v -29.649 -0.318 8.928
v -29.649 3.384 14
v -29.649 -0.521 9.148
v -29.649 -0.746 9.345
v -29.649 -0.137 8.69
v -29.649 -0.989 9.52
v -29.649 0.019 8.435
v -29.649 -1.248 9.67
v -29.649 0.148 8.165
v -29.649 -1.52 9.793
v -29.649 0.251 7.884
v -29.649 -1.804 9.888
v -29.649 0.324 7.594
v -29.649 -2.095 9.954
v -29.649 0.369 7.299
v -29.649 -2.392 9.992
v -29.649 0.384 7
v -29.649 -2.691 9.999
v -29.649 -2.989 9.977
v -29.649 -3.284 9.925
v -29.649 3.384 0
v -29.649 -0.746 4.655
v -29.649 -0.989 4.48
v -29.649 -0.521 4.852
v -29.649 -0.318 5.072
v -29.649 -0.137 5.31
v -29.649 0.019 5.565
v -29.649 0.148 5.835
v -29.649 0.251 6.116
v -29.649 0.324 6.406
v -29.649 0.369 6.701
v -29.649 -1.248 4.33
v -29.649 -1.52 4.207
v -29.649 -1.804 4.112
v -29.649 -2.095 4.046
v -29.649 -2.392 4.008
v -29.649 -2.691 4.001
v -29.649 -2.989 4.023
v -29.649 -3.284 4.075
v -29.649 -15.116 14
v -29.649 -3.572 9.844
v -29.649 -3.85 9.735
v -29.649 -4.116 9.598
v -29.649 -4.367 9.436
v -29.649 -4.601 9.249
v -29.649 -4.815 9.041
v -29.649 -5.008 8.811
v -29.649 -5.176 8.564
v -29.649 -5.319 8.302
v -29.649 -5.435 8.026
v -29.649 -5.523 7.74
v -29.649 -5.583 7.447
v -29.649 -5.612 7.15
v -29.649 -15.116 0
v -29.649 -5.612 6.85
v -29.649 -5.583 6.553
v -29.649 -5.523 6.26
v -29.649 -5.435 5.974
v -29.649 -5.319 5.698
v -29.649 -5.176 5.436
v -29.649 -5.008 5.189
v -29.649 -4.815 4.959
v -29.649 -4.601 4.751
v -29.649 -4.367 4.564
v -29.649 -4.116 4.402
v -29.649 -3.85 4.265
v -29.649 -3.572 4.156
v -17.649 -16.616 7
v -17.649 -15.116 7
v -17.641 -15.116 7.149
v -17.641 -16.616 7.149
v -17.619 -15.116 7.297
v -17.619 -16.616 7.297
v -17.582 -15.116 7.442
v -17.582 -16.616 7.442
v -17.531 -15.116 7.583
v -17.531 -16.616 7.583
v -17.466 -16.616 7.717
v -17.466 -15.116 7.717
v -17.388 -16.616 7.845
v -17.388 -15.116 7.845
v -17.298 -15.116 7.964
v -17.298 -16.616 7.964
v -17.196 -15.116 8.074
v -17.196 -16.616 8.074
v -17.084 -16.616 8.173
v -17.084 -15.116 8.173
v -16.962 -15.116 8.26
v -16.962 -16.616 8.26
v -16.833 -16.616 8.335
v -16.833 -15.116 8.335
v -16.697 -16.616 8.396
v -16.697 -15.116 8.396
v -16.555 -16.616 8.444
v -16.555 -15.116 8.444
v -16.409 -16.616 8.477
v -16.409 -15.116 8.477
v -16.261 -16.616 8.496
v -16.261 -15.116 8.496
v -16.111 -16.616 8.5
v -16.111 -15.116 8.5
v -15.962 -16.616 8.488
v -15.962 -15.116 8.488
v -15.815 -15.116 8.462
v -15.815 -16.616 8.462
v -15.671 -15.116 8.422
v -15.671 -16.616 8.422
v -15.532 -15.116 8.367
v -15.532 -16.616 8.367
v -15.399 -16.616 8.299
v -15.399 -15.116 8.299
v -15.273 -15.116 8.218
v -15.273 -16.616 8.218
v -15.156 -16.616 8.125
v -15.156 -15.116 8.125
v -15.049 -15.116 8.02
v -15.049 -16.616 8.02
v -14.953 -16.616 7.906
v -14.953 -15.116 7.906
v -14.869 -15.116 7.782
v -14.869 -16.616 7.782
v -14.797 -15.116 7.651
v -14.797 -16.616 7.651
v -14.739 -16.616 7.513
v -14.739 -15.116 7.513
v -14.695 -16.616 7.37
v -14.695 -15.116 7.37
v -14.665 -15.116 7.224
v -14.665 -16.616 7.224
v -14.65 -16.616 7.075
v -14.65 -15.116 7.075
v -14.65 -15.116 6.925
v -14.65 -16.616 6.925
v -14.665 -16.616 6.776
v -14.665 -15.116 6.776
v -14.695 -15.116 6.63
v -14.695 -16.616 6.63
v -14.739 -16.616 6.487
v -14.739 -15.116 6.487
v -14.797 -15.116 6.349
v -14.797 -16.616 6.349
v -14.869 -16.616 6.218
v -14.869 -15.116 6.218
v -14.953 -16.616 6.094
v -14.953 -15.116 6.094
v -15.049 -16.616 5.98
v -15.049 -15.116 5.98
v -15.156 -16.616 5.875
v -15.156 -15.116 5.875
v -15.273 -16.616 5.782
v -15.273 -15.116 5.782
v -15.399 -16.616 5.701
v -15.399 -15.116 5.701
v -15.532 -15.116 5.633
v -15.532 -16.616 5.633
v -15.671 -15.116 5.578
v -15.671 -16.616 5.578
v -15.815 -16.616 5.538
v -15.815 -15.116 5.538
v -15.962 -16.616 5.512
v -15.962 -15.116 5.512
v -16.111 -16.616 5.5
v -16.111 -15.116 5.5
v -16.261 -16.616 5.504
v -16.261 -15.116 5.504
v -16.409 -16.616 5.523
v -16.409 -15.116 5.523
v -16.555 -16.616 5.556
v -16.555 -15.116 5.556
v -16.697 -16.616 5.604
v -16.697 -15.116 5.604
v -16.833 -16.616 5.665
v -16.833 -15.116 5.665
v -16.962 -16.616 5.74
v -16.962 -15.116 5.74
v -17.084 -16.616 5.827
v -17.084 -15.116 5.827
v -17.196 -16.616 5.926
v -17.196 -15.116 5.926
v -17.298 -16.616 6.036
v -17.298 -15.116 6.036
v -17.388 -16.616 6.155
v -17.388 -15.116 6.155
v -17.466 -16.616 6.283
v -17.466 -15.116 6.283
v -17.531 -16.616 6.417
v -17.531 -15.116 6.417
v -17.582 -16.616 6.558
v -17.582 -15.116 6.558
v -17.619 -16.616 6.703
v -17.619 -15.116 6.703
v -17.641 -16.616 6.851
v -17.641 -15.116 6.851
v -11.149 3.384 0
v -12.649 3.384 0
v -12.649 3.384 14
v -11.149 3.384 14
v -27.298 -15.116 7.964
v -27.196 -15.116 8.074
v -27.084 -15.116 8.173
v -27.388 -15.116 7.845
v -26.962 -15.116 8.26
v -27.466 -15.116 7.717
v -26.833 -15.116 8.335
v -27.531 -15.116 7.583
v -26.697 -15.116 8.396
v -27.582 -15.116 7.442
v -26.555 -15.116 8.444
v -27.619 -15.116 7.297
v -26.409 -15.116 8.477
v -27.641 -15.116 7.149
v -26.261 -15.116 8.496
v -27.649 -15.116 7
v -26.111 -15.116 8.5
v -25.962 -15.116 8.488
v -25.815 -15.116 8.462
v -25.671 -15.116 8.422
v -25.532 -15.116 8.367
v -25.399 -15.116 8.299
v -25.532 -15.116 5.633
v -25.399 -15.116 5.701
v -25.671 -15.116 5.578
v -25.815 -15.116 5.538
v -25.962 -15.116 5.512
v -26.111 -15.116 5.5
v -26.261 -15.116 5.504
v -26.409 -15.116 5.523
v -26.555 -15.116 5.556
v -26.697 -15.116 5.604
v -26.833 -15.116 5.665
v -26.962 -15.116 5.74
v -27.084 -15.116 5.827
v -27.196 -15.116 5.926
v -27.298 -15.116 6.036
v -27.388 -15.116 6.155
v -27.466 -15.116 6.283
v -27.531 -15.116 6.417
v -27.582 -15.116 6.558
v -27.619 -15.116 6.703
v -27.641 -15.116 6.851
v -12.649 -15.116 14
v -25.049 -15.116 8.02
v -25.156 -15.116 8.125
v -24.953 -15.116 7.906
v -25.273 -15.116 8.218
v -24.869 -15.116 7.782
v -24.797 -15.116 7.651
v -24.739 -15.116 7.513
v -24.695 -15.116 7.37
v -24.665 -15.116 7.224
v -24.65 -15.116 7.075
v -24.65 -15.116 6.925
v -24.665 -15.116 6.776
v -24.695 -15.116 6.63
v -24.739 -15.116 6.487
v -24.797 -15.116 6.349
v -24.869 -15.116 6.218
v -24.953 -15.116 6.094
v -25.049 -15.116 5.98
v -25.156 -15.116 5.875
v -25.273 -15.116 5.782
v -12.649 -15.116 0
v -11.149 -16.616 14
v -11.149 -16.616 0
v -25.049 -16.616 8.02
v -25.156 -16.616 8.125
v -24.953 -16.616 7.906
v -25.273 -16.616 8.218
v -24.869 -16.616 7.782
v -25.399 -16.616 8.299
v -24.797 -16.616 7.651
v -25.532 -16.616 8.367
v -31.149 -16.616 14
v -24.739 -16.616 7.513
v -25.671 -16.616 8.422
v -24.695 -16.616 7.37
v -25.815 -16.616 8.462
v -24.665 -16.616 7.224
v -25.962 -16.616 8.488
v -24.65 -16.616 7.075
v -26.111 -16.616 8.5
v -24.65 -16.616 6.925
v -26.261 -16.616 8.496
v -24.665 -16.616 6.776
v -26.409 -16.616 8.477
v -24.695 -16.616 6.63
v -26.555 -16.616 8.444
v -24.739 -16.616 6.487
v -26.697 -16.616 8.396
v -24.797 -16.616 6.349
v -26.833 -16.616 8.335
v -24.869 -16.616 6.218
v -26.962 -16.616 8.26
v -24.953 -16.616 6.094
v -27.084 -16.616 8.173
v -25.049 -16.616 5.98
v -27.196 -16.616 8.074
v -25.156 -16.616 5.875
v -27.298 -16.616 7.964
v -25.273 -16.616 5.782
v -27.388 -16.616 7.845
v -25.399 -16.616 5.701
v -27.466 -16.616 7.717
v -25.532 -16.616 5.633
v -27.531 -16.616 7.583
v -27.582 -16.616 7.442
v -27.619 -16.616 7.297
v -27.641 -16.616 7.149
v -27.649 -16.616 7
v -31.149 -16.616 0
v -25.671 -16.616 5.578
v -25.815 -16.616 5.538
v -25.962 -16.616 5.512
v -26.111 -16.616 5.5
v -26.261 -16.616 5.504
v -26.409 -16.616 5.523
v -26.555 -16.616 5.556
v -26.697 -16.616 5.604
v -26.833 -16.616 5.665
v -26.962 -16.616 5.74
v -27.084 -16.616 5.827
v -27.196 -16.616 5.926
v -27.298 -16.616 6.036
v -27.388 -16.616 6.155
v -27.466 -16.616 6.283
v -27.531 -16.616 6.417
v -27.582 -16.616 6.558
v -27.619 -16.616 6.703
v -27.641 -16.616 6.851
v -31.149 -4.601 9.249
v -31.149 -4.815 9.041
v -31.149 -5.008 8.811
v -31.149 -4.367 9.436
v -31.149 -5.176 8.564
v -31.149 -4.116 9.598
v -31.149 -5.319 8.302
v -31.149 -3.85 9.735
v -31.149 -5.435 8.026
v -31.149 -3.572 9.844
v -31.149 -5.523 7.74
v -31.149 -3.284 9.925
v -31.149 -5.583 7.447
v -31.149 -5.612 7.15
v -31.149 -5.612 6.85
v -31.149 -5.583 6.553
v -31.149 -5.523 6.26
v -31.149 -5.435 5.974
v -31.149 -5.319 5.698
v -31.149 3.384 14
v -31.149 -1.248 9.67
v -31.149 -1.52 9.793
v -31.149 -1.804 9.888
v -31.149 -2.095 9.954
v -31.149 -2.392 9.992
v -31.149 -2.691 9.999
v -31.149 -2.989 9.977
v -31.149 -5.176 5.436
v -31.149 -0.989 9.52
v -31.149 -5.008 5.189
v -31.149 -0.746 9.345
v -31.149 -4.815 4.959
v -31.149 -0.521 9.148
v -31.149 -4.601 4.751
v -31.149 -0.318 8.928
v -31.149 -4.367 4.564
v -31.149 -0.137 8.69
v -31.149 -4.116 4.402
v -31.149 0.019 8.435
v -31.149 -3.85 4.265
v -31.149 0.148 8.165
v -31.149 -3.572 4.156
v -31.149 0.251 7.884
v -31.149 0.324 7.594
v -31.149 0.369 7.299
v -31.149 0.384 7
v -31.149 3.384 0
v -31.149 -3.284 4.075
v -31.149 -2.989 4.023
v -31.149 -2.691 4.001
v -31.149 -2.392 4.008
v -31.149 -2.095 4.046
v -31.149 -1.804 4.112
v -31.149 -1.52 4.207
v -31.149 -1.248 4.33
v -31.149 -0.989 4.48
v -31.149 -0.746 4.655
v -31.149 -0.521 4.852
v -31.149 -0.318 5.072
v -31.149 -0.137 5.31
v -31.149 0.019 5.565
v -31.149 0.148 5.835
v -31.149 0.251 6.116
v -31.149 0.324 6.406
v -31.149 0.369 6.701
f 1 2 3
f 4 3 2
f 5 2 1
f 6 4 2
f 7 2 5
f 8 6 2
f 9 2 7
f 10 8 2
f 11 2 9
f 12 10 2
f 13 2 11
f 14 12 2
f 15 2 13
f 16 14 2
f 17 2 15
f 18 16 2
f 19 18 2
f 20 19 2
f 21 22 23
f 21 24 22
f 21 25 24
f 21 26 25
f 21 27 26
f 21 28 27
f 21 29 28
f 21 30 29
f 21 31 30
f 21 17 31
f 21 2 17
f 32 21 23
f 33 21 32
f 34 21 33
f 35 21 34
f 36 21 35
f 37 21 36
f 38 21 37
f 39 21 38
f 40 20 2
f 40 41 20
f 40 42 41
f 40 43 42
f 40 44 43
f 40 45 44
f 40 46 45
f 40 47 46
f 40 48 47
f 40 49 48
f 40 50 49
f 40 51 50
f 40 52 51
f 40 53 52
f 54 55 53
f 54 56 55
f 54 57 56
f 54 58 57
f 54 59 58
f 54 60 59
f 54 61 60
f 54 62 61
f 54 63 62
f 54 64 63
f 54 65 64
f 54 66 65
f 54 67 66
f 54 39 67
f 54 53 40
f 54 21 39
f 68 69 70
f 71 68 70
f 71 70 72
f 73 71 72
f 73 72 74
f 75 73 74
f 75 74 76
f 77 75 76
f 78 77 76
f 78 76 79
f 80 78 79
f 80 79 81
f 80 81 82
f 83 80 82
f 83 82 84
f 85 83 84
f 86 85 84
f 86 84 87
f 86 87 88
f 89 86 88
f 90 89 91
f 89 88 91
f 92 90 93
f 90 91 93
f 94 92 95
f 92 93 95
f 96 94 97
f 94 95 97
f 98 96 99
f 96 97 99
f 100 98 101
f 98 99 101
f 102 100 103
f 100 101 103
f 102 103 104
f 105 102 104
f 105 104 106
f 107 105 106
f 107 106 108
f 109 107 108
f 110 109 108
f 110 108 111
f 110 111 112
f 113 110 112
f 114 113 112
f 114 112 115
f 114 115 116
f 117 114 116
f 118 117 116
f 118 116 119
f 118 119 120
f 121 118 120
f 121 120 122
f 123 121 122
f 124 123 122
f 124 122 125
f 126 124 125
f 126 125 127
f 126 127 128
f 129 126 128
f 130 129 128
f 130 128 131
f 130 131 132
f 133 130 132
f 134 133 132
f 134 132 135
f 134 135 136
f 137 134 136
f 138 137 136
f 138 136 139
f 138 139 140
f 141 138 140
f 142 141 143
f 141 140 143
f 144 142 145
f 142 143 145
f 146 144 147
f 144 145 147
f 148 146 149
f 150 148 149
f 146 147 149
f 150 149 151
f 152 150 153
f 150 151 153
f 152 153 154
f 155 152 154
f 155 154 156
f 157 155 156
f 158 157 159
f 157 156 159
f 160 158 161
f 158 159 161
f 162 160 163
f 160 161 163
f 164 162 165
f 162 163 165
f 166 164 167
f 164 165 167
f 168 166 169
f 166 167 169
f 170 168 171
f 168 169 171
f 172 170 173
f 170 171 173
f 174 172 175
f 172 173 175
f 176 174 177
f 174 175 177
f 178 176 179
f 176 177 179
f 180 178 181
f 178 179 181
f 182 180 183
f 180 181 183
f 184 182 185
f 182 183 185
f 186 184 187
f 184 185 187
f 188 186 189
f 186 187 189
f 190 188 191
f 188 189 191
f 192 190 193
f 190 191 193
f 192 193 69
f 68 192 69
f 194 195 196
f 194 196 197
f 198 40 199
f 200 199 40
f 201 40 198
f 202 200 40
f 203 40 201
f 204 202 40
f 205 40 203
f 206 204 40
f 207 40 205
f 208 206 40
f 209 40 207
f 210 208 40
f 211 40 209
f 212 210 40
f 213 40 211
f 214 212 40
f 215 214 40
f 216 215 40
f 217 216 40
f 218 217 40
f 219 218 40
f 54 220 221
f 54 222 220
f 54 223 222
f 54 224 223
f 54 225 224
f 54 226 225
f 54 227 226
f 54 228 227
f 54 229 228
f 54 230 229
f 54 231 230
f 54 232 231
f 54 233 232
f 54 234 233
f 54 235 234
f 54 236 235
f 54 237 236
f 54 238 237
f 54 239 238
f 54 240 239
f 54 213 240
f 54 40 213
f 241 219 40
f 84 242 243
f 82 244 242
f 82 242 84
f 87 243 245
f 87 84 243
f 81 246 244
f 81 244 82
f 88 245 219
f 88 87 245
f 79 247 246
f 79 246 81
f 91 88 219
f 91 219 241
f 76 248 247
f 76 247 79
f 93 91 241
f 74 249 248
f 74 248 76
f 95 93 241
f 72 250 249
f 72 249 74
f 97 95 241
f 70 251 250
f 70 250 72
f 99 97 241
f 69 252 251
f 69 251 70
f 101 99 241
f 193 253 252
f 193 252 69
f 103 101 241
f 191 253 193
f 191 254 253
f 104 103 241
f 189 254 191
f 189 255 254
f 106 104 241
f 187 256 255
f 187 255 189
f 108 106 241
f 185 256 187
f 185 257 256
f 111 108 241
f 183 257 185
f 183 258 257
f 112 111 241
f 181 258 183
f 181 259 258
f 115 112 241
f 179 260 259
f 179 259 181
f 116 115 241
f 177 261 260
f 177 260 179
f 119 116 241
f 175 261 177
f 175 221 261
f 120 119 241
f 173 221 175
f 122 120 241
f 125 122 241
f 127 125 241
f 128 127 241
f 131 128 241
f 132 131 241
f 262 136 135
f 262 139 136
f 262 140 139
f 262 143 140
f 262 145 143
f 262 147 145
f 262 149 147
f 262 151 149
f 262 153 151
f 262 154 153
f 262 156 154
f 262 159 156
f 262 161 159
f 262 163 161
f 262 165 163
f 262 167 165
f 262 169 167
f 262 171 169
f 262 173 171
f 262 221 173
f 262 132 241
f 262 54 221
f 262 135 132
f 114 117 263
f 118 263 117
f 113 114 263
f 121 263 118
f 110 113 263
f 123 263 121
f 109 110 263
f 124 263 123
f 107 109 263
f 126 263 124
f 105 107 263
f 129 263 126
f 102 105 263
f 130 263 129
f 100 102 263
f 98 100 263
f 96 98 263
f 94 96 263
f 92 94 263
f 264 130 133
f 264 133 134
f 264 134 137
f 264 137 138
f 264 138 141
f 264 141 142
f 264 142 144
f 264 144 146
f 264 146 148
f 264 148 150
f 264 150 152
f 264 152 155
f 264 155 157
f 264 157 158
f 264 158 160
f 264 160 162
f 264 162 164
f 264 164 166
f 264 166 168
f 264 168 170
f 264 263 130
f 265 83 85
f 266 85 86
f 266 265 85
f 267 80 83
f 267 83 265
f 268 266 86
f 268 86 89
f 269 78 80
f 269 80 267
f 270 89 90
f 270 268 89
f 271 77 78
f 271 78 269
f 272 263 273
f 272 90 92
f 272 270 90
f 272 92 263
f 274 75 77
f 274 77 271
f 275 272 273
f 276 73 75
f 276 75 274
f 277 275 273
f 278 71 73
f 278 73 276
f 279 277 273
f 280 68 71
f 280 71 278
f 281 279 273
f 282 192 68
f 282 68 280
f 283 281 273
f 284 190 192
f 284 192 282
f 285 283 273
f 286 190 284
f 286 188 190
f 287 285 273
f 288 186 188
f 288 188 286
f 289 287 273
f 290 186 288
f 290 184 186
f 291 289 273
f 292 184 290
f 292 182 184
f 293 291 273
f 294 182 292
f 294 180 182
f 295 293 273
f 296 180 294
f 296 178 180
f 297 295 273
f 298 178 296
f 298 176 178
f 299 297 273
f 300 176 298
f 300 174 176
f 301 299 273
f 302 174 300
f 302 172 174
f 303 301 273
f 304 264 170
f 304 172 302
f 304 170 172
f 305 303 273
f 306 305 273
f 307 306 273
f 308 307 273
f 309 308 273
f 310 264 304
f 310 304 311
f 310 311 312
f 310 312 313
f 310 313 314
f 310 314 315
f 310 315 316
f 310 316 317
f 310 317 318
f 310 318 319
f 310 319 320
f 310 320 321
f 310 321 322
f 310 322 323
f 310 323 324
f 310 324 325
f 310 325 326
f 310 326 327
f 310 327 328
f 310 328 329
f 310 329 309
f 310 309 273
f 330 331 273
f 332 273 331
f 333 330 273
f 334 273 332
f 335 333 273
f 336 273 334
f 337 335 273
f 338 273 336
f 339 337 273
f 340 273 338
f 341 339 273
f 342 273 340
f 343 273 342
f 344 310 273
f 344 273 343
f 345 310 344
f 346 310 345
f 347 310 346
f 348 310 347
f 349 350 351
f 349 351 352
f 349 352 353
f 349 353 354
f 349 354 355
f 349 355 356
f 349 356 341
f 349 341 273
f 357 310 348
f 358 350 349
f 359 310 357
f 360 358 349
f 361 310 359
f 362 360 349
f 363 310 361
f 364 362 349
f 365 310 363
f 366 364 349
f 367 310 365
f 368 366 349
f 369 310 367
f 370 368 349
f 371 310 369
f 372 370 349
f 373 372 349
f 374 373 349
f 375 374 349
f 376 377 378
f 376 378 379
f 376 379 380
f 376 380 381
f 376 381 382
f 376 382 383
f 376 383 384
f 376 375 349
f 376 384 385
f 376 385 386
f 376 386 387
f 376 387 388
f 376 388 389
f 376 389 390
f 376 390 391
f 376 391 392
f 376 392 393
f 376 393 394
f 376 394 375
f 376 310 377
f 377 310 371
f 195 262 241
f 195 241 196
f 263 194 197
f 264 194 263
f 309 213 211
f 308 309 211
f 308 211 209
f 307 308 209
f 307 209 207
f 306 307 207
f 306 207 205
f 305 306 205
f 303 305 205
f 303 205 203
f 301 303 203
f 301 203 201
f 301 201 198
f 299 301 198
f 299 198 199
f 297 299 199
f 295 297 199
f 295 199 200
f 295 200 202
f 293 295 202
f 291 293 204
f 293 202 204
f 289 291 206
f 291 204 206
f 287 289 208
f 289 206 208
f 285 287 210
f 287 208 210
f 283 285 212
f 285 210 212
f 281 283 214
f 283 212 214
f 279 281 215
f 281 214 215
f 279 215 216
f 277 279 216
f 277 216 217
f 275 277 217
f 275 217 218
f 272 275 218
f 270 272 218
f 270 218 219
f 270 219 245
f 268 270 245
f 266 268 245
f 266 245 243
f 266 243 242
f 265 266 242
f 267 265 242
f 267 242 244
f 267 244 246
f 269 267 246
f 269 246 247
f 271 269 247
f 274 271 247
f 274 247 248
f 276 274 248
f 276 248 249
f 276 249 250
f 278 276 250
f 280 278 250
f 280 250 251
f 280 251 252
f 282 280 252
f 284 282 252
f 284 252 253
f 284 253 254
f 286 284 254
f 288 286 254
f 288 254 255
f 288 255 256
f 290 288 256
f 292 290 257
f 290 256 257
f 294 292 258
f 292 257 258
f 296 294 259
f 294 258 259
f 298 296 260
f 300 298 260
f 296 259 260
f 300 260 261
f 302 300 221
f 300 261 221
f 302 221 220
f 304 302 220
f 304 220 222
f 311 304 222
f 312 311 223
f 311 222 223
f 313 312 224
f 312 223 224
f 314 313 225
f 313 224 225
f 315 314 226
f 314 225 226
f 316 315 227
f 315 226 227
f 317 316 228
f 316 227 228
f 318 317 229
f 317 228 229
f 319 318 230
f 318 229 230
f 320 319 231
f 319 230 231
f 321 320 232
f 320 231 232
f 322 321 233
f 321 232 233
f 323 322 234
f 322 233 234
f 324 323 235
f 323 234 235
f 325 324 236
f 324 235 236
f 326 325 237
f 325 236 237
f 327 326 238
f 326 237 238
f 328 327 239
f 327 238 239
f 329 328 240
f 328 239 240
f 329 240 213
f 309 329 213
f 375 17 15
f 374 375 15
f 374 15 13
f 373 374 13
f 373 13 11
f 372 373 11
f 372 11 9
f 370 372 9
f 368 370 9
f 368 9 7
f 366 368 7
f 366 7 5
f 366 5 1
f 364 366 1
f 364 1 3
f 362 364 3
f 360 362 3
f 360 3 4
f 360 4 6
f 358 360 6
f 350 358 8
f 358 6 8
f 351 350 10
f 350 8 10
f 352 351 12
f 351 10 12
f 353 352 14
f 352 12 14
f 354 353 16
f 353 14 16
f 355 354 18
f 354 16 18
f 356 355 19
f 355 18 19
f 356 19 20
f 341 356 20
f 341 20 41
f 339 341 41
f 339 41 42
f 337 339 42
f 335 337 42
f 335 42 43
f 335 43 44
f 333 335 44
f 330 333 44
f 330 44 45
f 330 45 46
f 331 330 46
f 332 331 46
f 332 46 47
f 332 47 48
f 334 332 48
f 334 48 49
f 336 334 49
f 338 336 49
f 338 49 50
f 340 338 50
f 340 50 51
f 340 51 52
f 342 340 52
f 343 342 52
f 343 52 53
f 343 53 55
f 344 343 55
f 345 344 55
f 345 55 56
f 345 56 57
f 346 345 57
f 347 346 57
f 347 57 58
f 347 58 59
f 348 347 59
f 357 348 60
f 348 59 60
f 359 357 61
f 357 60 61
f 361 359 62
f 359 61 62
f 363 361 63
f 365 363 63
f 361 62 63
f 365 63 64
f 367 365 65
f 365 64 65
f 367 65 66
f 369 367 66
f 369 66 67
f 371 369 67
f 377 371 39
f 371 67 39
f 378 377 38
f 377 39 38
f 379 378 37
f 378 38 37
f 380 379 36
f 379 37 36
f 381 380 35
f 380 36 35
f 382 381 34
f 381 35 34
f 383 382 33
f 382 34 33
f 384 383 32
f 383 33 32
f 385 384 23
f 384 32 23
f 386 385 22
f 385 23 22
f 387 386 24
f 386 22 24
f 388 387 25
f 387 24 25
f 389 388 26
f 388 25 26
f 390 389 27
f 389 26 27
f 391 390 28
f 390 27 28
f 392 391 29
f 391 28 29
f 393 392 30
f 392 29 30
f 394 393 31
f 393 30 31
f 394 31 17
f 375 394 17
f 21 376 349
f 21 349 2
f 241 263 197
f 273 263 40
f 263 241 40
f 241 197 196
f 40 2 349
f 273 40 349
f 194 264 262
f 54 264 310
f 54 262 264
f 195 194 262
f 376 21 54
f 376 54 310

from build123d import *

# Parameters (mm, degrees)
EXTRUSION1_DEPTH = 14
ESQUISSE2_R      = 1.5
EXTRUSION2_DEPTH = 39.83919024
ESQUISSE4_R      = 3
EXTRUSION3_DEPTH = 29.536760028


with BuildPart() as part:
    # Esquisse1 → Extrusion1 (new body)
    with BuildSketch(Plane.XY):
        Polygon((-31.14855853, 3.383843017), (-29.64855853, 3.383843017), (-29.64855853, -15.116156983), (-12.64855853, -15.116156983), (-12.64855853, 3.383843017), (-11.14855853, 3.383843017), (-11.14855853, -16.616156983), (-31.14855853, -16.616156983), align=None)
    extrude(amount=EXTRUSION1_DEPTH)

    # Esquisse2 → Extrusion2 (cut, through all)
    with BuildSketch(Plane(origin=(0, -15.116156983, 0), x_dir=(-1, 0, 0), z_dir=(0, 1, 0))):
        with Locations((26.14855853, 7)):
            Circle(ESQUISSE2_R)
        with Locations((16.14855853, 7)):
            Circle(ESQUISSE2_R)
    extrude(amount=-EXTRUSION2_DEPTH, mode=Mode.SUBTRACT)

    # Esquisse4 → Extrusion3 (cut, through all)
    with BuildSketch(Plane(origin=(-29.64855853, 0, 0), x_dir=(0, 0, -1), z_dir=(1, 0, 0))):
        with Locations(Location((-7, -2.616156983, 0), (0, 0, 90))):
            Circle(ESQUISSE4_R)
    extrude(amount=-EXTRUSION3_DEPTH, mode=Mode.SUBTRACT)


solid = part.part
